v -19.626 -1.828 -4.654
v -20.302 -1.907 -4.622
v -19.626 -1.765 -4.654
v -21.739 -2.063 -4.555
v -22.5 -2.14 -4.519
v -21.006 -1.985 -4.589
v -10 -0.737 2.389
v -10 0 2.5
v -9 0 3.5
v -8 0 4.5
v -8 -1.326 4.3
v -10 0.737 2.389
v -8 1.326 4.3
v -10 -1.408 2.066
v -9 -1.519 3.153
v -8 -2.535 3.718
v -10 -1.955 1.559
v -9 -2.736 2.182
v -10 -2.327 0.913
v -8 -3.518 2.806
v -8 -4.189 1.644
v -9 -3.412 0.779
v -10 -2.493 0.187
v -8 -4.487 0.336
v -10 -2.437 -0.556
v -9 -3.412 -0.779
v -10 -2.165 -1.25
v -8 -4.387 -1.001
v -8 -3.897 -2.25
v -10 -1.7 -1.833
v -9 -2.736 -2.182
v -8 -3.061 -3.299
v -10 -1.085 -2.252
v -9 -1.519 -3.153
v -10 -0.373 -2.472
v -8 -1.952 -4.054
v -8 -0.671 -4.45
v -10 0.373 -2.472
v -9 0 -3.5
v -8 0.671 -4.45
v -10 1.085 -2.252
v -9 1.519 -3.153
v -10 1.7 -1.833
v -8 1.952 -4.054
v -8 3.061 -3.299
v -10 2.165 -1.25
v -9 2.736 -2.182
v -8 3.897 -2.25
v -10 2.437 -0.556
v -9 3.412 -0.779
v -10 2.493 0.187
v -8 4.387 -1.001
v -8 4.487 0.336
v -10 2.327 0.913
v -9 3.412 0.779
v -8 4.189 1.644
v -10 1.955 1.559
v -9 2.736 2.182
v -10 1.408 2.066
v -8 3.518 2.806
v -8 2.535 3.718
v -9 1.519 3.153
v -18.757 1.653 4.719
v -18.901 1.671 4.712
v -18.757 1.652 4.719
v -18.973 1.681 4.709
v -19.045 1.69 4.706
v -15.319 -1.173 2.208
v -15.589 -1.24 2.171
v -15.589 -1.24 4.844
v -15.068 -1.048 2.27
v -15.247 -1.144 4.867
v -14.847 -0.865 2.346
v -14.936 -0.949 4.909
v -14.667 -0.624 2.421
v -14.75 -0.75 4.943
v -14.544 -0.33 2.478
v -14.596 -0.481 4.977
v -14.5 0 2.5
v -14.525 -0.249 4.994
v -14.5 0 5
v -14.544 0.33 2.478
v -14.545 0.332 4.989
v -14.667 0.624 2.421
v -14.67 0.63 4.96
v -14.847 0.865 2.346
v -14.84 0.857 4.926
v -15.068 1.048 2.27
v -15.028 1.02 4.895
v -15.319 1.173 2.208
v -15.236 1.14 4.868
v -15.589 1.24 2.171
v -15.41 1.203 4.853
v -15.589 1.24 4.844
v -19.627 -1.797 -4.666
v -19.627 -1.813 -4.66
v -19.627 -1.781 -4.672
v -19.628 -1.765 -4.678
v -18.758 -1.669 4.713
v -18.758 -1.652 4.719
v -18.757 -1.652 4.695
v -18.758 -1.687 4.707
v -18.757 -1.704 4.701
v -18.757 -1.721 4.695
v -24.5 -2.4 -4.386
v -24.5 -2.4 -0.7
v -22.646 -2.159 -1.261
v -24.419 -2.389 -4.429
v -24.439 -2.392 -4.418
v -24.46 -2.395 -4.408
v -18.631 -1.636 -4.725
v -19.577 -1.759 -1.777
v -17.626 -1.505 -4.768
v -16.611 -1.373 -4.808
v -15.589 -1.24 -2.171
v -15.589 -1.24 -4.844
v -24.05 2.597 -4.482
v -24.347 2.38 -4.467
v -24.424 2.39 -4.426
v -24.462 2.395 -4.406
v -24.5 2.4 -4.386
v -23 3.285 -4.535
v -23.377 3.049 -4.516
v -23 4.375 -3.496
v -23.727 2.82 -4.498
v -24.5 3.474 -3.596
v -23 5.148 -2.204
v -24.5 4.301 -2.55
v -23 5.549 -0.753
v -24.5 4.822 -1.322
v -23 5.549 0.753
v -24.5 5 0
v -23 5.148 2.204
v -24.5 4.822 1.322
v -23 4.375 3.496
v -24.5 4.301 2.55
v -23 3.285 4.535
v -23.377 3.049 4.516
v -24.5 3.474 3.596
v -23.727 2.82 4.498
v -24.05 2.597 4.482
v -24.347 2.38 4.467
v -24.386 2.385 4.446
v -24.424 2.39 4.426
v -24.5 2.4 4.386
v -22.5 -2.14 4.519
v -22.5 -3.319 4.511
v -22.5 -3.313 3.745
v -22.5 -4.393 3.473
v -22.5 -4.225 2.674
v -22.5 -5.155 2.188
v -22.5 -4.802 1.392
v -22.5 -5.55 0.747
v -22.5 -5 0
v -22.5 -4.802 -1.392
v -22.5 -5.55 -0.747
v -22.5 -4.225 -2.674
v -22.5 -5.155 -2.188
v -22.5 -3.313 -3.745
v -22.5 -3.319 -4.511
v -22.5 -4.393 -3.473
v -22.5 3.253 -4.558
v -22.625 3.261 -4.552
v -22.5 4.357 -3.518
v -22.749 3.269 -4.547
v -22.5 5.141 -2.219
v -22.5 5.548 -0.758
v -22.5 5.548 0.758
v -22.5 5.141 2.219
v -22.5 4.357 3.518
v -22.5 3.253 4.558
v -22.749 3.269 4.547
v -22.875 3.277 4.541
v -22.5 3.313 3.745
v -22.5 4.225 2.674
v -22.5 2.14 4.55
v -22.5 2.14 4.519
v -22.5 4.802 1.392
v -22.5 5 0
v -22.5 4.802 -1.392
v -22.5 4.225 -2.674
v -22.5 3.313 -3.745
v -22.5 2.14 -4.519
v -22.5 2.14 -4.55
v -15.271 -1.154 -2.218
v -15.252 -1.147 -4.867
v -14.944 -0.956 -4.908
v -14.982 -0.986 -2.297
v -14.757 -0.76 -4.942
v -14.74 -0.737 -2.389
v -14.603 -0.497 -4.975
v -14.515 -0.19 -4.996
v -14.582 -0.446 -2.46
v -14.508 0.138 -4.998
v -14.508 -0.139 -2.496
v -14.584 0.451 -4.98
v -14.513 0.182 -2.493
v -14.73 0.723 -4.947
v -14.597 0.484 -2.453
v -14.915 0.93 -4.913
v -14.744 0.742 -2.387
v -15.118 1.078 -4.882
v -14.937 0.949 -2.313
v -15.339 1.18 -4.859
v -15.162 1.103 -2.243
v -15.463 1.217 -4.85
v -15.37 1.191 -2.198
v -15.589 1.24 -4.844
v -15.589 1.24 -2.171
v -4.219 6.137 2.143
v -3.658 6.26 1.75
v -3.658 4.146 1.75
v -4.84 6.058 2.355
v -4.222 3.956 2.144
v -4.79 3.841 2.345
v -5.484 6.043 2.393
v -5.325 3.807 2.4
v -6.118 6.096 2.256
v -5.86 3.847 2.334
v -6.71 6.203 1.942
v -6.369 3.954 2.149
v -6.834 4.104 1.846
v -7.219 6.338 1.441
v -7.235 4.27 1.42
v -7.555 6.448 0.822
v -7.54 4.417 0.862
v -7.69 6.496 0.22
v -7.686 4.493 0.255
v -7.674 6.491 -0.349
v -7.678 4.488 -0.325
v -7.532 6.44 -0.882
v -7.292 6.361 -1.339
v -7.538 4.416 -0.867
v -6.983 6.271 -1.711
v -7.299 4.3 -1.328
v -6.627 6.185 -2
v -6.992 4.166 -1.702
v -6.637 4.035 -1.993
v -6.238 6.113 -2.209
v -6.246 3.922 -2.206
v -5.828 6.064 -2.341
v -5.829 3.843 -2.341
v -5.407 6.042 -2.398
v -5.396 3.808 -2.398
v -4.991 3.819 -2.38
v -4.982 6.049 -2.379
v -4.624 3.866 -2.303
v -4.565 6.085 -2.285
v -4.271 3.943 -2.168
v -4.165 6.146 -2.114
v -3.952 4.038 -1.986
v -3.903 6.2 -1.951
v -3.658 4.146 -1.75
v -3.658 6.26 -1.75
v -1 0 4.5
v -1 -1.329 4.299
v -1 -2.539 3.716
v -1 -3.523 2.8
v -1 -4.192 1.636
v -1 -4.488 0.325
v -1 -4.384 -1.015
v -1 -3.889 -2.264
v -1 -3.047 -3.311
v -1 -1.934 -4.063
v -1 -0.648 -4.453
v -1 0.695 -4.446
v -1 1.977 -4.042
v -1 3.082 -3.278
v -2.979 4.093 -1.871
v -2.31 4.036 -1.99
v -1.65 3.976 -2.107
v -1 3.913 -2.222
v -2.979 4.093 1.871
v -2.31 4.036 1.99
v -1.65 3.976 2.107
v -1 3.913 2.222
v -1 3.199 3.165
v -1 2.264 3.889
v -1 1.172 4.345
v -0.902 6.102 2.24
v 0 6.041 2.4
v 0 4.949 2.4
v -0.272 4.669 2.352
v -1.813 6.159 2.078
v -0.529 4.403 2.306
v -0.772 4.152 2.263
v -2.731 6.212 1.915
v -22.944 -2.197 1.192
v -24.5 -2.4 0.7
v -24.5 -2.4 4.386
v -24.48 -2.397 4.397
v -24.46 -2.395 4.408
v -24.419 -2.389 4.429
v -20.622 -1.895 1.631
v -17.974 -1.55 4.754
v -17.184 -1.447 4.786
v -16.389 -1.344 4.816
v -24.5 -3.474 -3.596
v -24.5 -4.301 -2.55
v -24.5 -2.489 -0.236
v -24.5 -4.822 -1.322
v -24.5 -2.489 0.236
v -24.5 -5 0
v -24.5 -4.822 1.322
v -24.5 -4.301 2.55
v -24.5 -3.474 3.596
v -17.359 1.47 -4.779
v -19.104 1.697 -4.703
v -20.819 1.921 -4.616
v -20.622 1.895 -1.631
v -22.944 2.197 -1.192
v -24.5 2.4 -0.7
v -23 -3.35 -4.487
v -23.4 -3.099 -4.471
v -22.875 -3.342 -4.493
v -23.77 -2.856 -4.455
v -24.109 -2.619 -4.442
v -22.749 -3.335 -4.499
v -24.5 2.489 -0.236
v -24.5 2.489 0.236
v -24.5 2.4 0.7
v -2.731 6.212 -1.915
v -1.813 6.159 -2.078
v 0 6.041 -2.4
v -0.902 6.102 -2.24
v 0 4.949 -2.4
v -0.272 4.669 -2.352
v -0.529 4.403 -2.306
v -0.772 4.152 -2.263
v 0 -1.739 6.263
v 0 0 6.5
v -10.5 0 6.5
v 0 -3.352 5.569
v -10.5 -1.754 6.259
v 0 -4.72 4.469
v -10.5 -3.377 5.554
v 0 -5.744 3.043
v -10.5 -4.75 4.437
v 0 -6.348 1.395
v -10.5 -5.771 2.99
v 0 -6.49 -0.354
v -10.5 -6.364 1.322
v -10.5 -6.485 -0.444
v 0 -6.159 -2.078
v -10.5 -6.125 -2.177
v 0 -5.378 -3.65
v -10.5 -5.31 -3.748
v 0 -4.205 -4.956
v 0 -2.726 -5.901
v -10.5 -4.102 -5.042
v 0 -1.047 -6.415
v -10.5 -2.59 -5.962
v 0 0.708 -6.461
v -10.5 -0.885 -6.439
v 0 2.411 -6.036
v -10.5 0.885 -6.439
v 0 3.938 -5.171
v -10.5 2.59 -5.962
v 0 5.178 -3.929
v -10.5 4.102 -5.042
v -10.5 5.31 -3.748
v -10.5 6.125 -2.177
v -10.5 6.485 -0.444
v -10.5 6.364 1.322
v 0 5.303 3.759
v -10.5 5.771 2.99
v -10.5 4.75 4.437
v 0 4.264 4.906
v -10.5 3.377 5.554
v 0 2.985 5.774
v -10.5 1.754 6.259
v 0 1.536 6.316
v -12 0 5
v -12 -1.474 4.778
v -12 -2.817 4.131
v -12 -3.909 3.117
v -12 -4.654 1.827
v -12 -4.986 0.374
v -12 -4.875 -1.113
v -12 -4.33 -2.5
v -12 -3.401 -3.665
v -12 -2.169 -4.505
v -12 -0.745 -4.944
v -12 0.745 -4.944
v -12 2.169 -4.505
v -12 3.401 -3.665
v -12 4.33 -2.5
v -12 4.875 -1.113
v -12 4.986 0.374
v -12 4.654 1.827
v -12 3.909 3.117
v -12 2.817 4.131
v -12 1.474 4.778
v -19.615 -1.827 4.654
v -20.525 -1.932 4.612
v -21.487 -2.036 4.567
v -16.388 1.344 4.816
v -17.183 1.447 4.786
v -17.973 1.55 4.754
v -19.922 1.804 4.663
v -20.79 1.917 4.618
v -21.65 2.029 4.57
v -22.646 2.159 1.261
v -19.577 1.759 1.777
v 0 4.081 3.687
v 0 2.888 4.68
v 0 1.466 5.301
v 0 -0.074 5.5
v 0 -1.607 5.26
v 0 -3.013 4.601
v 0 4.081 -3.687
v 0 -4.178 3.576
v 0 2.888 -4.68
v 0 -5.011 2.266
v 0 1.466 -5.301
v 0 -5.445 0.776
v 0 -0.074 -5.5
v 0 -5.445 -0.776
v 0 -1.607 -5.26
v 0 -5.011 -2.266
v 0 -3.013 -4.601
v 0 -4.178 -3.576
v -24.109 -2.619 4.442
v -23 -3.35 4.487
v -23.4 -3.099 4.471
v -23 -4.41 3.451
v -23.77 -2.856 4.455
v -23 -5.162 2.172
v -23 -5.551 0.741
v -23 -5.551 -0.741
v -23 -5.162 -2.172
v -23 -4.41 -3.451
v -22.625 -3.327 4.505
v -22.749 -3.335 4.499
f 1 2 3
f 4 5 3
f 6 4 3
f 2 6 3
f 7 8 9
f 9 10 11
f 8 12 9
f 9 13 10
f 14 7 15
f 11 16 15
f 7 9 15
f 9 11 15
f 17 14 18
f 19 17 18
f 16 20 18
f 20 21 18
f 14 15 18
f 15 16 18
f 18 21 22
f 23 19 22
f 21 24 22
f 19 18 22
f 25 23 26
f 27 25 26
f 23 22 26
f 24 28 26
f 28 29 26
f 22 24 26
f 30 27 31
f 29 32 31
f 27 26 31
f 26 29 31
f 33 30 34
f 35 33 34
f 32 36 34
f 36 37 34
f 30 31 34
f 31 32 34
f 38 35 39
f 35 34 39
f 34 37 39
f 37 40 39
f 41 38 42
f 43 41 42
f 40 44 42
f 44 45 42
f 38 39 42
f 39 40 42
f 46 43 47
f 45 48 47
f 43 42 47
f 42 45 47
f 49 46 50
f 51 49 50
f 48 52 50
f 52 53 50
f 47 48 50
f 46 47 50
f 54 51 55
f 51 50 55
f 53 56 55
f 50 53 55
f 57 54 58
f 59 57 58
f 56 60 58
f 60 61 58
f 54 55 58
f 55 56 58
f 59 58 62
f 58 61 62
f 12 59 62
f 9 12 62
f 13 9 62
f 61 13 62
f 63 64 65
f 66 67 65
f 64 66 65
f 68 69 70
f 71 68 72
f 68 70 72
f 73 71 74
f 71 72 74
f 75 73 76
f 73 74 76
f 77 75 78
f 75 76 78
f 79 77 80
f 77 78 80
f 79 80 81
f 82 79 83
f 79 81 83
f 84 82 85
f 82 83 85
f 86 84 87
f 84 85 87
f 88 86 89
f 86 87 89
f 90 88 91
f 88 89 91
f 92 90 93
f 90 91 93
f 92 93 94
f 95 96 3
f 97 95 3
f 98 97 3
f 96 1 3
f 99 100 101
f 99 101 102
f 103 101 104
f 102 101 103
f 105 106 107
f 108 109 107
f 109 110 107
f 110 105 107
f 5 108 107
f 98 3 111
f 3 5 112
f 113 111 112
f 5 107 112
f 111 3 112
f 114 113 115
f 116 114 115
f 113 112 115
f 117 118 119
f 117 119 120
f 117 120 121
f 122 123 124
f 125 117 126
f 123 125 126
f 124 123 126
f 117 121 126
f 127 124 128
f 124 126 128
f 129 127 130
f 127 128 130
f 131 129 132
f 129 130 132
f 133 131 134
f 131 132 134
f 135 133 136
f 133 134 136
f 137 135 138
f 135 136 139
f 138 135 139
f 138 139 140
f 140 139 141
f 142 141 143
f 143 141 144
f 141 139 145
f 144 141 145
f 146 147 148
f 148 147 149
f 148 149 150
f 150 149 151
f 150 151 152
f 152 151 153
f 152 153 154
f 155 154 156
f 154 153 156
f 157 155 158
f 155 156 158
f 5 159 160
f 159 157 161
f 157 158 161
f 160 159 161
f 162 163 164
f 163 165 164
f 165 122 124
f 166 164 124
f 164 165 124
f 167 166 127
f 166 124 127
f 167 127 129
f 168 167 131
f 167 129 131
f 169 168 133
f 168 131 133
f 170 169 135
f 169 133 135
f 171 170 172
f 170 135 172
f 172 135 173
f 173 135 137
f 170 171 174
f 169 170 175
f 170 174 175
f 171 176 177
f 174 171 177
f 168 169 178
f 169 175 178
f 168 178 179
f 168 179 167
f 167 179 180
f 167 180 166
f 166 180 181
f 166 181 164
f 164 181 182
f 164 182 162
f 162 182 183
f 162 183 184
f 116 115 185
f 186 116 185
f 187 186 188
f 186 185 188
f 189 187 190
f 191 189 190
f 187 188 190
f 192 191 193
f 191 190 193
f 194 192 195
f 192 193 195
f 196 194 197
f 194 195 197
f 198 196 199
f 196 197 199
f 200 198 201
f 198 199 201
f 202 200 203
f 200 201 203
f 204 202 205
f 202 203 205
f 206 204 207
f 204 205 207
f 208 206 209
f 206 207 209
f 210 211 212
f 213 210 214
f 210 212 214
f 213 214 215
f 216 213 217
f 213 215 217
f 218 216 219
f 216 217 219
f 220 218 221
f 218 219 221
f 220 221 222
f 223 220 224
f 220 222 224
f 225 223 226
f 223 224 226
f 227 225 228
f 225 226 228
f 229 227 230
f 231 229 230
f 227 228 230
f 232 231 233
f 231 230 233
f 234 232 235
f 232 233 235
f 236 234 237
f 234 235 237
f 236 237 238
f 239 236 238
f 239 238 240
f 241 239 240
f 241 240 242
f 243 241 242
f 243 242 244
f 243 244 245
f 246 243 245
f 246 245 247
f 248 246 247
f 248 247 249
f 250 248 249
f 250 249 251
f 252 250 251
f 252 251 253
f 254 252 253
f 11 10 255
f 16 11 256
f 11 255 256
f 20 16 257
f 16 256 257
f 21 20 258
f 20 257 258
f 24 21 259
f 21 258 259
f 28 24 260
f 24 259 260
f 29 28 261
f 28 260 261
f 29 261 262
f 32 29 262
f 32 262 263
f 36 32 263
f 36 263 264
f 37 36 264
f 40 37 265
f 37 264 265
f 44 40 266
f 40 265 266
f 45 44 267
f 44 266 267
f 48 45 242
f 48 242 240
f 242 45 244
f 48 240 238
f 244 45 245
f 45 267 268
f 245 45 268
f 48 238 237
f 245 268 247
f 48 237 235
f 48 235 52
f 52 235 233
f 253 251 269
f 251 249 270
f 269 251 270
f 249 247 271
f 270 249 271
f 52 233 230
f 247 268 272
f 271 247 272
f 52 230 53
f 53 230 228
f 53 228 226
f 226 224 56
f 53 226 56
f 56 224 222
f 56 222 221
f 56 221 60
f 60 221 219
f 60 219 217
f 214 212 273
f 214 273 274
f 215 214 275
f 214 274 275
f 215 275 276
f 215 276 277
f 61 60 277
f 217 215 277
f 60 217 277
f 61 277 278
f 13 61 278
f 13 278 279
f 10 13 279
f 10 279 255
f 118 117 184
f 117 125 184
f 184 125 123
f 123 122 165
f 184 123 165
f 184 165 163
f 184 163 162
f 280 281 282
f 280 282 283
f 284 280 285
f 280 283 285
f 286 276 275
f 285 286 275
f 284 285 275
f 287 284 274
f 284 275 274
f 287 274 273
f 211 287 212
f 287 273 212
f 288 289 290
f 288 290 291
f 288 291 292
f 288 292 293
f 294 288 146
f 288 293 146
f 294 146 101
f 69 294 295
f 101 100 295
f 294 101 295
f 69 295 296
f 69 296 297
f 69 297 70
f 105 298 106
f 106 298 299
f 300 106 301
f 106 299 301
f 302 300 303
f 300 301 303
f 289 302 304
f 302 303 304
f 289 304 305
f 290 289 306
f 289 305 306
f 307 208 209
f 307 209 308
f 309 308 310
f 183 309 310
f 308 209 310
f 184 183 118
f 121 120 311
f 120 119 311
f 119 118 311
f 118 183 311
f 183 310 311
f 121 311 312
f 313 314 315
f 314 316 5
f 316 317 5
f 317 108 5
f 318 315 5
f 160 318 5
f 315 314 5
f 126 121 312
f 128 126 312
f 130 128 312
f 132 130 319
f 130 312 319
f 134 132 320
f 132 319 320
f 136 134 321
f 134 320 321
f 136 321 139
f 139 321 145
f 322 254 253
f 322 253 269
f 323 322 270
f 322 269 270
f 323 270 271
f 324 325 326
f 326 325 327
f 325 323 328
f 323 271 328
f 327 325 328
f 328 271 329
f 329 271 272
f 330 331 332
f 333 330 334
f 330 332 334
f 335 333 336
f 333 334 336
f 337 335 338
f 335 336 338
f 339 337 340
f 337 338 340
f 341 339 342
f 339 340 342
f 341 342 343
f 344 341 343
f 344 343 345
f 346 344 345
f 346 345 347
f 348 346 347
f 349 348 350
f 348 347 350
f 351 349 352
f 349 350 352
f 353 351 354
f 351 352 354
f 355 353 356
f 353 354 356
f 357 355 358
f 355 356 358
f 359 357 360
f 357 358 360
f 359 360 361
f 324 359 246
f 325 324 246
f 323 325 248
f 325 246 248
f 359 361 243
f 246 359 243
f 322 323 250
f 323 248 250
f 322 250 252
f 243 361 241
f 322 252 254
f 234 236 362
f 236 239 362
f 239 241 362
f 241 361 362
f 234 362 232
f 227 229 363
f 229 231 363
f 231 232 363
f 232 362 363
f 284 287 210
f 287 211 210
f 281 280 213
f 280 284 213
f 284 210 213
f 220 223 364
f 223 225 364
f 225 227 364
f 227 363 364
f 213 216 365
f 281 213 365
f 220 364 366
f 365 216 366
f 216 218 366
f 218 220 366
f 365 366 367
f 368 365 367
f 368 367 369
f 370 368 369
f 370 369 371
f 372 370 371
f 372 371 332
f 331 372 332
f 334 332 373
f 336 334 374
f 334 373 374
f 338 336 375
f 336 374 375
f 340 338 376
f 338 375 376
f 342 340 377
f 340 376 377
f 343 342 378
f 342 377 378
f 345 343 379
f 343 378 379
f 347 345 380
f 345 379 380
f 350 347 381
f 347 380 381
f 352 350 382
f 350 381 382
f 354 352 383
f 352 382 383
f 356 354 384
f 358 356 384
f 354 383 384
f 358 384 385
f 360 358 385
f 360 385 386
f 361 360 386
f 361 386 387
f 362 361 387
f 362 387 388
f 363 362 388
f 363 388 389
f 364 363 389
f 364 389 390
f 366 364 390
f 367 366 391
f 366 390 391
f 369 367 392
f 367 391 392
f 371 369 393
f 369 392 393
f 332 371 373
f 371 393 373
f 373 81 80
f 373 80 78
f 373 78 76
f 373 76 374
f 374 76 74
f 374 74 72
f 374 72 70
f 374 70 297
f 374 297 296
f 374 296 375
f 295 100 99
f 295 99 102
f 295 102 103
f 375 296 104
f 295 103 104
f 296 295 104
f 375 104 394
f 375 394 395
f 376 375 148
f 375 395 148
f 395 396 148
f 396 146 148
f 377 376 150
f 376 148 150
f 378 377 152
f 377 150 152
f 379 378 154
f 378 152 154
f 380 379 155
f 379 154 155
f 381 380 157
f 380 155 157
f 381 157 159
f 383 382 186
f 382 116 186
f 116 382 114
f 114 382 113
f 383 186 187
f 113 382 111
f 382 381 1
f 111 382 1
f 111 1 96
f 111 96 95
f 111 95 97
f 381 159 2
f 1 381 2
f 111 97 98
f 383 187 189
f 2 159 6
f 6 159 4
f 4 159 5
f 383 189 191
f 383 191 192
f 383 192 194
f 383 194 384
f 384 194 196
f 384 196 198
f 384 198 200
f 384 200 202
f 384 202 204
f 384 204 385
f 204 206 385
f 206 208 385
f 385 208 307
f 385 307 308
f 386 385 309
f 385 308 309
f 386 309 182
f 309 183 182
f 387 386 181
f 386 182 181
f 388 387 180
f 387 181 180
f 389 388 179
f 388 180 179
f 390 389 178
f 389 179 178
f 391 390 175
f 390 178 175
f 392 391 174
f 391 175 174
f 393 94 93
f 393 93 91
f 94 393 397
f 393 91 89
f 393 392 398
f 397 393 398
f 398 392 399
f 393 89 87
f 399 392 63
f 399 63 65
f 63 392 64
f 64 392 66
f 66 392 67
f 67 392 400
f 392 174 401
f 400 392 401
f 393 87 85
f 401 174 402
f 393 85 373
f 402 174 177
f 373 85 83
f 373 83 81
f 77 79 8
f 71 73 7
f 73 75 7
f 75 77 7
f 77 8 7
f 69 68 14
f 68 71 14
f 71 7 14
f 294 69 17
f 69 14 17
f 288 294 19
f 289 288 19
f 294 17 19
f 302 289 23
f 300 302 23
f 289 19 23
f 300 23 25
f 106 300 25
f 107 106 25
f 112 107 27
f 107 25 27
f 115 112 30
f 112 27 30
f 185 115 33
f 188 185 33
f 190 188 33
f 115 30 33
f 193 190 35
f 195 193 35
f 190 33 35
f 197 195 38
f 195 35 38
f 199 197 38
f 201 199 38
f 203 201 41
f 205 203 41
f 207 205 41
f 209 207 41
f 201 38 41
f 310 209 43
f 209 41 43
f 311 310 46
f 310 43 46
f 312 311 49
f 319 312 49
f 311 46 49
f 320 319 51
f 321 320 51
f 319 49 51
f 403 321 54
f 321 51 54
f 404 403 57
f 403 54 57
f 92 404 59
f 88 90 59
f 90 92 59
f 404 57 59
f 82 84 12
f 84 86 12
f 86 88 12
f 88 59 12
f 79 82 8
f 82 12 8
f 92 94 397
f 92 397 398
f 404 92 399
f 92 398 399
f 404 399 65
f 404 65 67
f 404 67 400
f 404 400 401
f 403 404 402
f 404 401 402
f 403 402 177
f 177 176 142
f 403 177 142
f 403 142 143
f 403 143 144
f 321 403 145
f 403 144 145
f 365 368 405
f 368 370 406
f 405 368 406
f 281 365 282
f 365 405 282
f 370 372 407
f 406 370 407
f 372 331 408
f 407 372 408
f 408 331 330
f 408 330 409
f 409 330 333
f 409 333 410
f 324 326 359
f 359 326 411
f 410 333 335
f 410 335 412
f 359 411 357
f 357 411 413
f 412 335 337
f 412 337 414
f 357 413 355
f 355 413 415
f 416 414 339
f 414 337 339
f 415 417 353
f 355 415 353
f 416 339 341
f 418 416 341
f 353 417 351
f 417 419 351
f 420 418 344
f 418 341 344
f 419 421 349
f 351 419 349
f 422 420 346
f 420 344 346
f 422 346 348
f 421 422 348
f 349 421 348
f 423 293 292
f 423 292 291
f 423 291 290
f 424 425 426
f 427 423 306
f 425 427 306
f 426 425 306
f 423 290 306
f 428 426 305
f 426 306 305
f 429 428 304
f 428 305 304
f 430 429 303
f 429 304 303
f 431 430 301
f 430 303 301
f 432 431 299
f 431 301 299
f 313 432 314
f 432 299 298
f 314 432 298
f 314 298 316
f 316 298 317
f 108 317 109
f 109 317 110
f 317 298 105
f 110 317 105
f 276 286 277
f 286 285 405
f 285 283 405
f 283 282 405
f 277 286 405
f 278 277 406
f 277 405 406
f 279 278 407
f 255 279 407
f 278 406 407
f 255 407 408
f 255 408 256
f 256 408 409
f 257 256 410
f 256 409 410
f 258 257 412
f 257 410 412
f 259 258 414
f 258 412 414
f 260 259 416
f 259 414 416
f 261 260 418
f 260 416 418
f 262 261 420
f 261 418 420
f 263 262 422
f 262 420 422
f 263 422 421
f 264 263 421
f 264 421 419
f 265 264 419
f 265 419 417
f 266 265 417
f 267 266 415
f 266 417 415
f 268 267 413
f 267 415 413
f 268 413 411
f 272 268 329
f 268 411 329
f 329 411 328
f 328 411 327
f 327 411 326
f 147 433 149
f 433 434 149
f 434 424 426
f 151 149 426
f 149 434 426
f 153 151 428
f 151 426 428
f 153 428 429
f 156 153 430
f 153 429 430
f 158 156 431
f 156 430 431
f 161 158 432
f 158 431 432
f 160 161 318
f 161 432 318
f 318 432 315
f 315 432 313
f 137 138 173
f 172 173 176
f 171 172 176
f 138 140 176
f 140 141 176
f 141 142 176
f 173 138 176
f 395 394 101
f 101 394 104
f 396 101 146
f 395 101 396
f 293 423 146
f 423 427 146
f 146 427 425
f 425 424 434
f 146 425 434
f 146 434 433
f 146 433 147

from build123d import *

# Parameters (mm, degrees)
F3_DEPTH  = 6.501
F5_DEPTH  = 50
F8_W      = 9.4140861183
F8_H      = 9.8263791297
F9_DEPTH  = 25
F12_W     = 14.8912463337
F12_H     = 11.3480030559
F13_DEPTH = 25


with BuildPart() as f1:
    # F0 (on Front) → F1 (revolve)
    with BuildSketch(Plane.XZ):
        Polygon((-12, 5), (-22.5, 5), (-22.5, 5.6), (-23, 5.6), (-24.5, 5), (-24.5, 2.5), (-10, 2.5), (-8, 4.5), (-1, 4.5), (0, 5.5), (0, 6.5), (-10.5, 6.5), align=None)
    revolve(axis=Axis((-0.2357512317, 0, 0), (1, 0, 0)))

    # F2 (on Front) → F3 (cut, through all)
    with BuildSketch(Plane.XZ):
        with BuildLine():
            Line((0, 2.4), (-3.6575932294, 1.75))
            ThreePointArc((-3.6575932294, 1.75), (-7.7, 0), (-3.6575932294, -1.75))
            Line((-3.6575932294, -1.75), (0, -2.4))
            Line((0, -2.4), (0, 2.4))
        make_face()
    extrude(amount=-F3_DEPTH, mode=Mode.SUBTRACT)

    # F4 (on Top) → F5 (cut, symmetric)
    with BuildSketch(Plane.XY):
        with BuildLine():
            Line((-15.5885848908, 1.2395342523), (-24.5, 2.4))
            Line((-24.5, 2.4), (-24.5, -2.4))
            Line((-24.5, -2.4), (-15.5885848908, -1.2395342523))
            ThreePointArc((-15.5885848908, -1.2395342523), (-14.5, 0), (-15.5885848908, 1.2395342523))
        make_face()
    extrude(amount=F5_DEPTH, both=True, mode=Mode.SUBTRACT)

    # F8 (on 3pt) → F9 (cut)
    with BuildSketch(Plane(origin=(-0.2560212454, -0.0401067578, -5.558750384), x_dir=(0.9989411003, -0.0003319376, -0.046006173), z_dir=(0.0460073704, 0.0072072396, 0.9989151003))):
        with Locations((-24.0980023518, 1.025695703)):
            Rectangle(F8_W, F8_H)
    extrude(amount=-F9_DEPTH, mode=Mode.SUBTRACT)

    # F12 (on 3pt) → F13 (cut)
    with BuildSketch(Plane(origin=(-0.2560212454, -0.0401067578, 5.558750384), x_dir=(0.9989411003, -0.0003319376, 0.046006173), z_dir=(0.0460073704, 0.0072072396, -0.9989151003))):
        with Locations((-25.9663937613, -0.8096385282)):
            Rectangle(F12_W, F12_H)
    extrude(amount=-F13_DEPTH, mode=Mode.SUBTRACT)


solid = f1.part
